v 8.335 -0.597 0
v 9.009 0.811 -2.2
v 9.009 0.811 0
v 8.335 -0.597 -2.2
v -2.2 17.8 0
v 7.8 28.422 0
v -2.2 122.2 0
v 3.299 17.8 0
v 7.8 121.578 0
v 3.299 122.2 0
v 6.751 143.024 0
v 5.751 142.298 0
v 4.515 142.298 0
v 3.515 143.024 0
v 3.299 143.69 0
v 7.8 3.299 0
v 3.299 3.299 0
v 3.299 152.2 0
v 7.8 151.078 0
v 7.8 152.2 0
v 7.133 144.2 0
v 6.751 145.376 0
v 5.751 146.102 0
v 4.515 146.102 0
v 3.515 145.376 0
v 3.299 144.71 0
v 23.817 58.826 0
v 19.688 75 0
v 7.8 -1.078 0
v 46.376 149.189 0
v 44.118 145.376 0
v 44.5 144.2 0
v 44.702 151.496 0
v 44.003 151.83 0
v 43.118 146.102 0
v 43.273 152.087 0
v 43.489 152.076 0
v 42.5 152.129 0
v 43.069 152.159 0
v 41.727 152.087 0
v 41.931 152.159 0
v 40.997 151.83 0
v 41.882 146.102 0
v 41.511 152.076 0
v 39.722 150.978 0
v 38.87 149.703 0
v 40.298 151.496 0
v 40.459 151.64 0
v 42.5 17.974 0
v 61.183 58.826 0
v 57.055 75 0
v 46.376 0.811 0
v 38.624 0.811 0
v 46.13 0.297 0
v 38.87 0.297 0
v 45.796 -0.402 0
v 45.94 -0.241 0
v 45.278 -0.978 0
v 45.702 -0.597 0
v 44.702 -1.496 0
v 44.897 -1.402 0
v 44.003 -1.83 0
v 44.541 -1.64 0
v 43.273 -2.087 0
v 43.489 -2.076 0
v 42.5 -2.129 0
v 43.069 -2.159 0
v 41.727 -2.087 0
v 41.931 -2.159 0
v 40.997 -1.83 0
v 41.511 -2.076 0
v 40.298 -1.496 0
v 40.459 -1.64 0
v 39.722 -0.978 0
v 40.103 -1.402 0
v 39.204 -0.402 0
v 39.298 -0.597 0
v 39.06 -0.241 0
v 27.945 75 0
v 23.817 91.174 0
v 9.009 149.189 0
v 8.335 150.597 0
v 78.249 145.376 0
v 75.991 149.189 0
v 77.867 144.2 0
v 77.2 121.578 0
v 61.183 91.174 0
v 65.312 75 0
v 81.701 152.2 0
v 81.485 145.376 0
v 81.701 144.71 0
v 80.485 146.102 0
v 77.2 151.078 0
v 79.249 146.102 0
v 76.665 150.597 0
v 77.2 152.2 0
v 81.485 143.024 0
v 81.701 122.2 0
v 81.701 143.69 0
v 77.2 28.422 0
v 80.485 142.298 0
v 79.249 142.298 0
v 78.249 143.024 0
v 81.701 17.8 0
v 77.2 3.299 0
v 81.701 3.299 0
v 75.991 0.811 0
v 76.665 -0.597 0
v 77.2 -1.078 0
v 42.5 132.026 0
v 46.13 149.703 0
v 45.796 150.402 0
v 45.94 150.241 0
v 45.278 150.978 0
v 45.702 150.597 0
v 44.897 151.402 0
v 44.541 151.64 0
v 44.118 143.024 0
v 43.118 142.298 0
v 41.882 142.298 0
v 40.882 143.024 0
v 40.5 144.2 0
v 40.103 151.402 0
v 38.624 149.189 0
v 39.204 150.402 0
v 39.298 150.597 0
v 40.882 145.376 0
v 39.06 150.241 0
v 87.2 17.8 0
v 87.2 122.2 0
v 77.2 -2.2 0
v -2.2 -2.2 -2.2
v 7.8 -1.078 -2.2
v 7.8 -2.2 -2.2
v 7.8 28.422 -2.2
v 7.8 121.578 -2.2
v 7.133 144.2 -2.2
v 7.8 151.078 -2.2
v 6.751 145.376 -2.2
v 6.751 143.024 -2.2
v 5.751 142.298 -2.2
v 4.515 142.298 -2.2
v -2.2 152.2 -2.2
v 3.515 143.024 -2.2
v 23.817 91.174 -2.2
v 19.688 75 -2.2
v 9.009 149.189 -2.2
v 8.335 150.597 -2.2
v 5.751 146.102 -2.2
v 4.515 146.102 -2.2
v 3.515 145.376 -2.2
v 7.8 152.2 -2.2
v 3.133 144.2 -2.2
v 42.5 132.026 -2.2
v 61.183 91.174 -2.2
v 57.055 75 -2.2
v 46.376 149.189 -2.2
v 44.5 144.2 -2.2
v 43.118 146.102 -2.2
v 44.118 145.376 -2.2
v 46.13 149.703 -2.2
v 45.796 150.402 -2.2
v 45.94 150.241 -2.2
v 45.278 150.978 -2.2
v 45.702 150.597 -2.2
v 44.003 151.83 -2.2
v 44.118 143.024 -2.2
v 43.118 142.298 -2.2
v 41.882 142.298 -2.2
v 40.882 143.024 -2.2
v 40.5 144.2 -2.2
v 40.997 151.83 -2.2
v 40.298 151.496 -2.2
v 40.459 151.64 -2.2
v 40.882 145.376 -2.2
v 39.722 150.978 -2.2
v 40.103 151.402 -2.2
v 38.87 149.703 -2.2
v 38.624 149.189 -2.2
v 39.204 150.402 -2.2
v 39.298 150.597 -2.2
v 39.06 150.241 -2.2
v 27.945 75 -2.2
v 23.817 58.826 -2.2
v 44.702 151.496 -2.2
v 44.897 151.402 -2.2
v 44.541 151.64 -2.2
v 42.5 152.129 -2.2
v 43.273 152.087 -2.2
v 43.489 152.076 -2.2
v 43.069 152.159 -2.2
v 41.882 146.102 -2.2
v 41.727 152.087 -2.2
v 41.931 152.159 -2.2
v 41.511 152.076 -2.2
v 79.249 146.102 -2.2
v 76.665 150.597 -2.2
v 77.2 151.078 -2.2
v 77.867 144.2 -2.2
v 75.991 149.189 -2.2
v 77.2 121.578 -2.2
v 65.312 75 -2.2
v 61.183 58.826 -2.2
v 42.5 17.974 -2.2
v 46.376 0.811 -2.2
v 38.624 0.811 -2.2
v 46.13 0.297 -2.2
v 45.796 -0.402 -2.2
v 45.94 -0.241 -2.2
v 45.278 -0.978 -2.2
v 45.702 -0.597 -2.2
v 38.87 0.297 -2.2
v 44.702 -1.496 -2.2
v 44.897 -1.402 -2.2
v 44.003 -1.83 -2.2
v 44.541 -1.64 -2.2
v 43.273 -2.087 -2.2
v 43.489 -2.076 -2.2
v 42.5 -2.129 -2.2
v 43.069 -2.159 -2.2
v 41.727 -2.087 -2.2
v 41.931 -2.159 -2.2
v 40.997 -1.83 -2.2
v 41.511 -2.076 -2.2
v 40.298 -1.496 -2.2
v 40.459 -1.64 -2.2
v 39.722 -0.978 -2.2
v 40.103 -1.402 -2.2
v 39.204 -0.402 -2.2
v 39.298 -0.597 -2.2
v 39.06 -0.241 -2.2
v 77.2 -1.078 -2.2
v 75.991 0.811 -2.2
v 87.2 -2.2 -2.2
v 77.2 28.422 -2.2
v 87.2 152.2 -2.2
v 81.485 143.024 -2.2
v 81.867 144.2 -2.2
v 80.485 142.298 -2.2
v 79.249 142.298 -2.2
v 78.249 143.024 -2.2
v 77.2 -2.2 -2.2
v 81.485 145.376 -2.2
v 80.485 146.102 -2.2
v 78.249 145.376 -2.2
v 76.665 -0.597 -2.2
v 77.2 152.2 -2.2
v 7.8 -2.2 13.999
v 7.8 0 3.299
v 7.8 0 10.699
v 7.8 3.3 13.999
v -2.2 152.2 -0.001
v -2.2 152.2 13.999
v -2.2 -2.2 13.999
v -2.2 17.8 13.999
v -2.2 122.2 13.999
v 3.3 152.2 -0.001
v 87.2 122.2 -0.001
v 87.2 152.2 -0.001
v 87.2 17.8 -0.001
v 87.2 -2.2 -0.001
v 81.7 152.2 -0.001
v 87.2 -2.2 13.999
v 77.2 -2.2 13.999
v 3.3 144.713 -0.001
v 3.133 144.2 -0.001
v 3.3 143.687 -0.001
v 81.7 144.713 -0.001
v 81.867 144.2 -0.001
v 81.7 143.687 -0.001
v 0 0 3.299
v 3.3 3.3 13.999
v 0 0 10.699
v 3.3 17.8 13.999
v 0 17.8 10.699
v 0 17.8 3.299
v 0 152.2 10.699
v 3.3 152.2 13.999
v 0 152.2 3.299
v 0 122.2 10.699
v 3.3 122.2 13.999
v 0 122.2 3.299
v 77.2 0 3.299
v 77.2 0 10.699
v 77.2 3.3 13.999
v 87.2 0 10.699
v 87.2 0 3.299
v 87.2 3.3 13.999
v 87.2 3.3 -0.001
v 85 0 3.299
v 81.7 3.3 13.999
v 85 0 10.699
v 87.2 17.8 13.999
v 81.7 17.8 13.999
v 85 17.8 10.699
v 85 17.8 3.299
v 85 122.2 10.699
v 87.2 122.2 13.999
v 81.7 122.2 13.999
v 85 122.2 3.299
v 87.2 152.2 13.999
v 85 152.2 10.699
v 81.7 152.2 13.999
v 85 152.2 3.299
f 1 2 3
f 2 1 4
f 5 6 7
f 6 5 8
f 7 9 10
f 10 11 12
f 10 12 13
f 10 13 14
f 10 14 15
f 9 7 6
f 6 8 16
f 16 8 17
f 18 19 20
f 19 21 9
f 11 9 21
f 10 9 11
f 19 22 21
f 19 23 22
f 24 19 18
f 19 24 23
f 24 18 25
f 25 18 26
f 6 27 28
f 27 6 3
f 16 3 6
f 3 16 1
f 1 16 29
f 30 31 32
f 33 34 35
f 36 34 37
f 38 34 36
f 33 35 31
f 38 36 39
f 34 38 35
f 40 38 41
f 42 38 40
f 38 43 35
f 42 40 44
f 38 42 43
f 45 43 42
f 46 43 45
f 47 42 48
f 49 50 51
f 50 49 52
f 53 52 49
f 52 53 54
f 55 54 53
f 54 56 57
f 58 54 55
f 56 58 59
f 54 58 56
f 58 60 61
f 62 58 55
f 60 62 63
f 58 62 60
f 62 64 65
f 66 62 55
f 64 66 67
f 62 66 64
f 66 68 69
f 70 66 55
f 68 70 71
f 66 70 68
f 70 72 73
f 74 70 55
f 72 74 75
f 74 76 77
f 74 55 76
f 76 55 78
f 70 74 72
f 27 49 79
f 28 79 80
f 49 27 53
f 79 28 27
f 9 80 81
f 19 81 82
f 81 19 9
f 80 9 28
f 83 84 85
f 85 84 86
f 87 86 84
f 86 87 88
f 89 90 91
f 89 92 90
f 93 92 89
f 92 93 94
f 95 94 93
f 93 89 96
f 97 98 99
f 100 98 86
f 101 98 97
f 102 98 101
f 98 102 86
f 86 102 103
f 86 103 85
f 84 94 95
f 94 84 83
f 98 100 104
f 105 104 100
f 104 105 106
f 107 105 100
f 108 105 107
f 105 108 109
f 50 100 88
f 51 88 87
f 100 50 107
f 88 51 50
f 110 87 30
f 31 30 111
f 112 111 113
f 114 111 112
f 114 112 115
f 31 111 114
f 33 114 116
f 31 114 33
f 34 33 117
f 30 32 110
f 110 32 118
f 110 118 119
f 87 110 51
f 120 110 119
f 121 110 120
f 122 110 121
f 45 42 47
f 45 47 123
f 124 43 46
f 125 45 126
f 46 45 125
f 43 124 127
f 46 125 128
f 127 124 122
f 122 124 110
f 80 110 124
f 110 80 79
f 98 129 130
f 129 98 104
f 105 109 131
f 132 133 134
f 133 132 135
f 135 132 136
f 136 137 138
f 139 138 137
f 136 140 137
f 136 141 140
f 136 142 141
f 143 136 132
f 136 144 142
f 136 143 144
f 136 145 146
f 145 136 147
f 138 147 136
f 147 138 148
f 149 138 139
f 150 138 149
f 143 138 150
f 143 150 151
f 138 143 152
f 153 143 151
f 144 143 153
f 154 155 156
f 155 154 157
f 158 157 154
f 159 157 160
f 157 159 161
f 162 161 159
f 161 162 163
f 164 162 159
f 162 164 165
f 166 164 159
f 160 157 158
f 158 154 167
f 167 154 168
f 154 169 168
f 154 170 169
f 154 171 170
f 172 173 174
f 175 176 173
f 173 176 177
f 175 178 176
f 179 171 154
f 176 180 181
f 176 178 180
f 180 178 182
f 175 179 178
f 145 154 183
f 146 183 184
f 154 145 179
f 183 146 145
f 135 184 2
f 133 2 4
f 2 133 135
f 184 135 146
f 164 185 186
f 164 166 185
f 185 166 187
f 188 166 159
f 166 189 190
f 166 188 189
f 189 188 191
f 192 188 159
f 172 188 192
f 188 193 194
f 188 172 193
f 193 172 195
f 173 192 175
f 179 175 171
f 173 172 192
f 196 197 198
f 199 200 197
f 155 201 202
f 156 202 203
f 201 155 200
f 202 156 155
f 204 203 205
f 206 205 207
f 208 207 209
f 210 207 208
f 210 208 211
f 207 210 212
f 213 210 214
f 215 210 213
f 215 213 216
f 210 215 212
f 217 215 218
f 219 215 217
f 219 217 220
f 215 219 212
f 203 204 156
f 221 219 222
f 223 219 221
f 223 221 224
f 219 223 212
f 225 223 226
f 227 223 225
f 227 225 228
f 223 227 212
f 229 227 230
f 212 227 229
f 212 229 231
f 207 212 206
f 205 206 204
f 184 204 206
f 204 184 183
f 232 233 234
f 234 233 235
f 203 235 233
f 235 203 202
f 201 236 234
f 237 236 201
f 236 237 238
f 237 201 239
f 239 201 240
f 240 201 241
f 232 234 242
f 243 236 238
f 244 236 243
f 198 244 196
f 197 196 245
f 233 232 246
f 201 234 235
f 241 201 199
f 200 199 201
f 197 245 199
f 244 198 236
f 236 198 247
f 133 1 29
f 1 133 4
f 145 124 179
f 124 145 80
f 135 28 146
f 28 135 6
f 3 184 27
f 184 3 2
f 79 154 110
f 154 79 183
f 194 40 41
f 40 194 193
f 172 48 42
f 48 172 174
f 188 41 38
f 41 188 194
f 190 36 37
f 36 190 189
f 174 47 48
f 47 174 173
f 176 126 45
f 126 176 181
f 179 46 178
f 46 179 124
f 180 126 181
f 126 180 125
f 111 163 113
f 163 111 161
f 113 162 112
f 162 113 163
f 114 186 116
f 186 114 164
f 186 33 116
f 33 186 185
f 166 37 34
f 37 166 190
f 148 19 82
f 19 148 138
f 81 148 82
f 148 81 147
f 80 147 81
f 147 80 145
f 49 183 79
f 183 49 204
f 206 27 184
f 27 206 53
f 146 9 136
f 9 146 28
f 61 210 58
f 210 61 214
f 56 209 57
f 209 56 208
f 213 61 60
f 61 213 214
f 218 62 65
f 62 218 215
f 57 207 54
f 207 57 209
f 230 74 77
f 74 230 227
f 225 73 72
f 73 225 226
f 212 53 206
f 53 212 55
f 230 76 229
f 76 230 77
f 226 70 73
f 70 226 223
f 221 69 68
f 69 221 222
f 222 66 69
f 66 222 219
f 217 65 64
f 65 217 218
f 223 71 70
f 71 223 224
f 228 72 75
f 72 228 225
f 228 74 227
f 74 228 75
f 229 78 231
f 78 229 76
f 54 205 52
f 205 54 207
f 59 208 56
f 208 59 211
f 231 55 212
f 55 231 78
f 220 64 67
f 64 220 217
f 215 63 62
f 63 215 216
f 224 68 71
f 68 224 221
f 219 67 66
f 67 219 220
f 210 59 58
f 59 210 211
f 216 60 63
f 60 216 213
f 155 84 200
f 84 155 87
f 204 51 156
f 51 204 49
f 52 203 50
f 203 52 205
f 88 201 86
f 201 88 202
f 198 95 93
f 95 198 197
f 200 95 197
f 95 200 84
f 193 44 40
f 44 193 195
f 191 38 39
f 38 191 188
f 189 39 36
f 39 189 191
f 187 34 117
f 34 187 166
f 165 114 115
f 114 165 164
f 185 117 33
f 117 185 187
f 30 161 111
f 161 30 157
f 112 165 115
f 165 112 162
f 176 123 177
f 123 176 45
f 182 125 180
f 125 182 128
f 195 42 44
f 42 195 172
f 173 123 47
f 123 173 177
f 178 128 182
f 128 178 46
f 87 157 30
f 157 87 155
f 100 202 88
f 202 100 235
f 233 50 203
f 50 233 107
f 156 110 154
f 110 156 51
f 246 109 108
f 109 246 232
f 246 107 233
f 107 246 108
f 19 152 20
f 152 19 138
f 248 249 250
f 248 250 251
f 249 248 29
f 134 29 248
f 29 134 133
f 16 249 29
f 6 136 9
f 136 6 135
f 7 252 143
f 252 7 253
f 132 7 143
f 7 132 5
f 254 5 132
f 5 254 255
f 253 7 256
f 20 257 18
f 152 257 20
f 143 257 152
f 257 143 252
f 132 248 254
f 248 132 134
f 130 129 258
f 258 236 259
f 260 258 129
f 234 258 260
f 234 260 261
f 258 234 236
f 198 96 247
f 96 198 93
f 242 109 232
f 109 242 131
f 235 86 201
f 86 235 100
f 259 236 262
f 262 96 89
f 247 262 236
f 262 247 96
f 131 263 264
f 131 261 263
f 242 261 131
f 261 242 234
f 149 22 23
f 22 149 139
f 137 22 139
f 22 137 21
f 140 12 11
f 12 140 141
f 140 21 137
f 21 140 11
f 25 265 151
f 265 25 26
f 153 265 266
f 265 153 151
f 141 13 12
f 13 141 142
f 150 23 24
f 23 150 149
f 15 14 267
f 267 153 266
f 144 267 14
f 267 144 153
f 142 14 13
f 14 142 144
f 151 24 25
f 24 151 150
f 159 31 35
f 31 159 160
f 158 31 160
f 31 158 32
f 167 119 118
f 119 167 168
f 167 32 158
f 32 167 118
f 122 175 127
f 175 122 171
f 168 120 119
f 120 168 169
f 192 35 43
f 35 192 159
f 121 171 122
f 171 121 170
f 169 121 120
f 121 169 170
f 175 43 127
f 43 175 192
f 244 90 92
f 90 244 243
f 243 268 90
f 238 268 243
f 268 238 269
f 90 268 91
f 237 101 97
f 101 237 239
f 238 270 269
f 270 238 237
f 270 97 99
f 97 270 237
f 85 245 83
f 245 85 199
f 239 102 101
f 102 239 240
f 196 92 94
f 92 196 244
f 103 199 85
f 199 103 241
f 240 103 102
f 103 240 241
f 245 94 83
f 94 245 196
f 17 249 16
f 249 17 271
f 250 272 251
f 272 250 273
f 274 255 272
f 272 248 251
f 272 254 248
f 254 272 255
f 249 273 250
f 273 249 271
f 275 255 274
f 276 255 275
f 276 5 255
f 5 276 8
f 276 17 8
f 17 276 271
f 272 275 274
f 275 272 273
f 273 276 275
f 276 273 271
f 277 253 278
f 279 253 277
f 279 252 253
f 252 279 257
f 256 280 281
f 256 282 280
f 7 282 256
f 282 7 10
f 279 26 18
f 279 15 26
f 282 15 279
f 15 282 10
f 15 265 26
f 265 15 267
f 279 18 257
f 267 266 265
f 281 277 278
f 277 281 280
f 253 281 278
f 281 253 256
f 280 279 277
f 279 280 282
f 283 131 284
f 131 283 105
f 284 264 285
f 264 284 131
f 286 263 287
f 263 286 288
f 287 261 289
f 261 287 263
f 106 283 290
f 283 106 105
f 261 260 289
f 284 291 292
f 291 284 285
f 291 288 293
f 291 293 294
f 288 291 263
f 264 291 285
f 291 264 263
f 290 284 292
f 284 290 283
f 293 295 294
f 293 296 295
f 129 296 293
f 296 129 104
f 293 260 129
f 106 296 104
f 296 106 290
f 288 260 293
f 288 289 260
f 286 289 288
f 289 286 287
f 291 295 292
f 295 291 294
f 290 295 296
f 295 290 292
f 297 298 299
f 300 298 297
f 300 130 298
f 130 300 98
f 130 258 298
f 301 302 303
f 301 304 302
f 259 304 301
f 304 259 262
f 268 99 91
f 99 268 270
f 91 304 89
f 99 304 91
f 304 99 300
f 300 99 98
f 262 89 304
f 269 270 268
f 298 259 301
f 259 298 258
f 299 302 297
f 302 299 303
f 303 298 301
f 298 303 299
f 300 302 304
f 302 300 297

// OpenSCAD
// Boat phone holder

delta = 0.001;    // Extra distance to avoid coincident surfaces 
sqrt2 = sqrt(2);

hp    = 150;      // Height of phone
wp    = 85;       // Width of phone
dp    = 14;       // Depth of phone
dpe   = 12;       // Depth of phone at edge

module Bevel(l,t,orientation)
{
  // Bevel with corner along +X axis from origin, with orientation:
  //  0 -> facing +Y, +Z
  //  1 -> facing -Y, +Z
  //  2 -> facing -Y, -Z
  //  3 -> facing +Y, -Z
  rotate([orientation*90,0,0])
  {
    intersection()
    {
      translate([0,0,-t])
        rotate([45,0,0])
          cube([l,t*sqrt2,t*sqrt2]);
      cube([l,t*2,t*2]);
    }
  }
}

module EdgeClasp(l,h,t,orientation)
{
  // Edge clip on X-Z plane, with orientation:
  //  0 -> facing +Y
  //  1 -> facing +X
  //  2 -> facing -Y
  //  3 -> facing -X
  //
  // l = extent along aligneed axis (from origin, + or -)
  // t = thickness of edge
  //
  la = abs(l);
  ls = orientation==0 || orientation == 3 ? l : -l ;
  rotate([0,0,-orientation*90])
    translate([0.5*(ls-la),-t,-delta])
    {
      cube([la,t,h]);
      Bevel(la,t*2.5,0);
      translate([0,0,h])
        Bevel(la,t*2.5,3);
    }
}

module AngledStrip(x1,y1,x2,y2,w,t)
{
  xd = x2-x1;
  yd = y2-y1;
  l = sqrt(xd*xd+yd*yd);
  translate([x1,y1,0])
  {
    rotate([0,0,atan2(yd,xd)])
    {
      translate([0,0,0])    cylinder(r=w/2, h=t, $fn=16);
      translate([0,-w/2,0]) cube([l,w,t]);
      translate([l,0,0])    cylinder(r=w/2, h=t, $fn=16);
    }
  }
}

module BasePlate(w,h,t,ws,wc)
{
  x1 = ws - wc/3;
  x2 = w/2;
  x3 = w - x1;
  y1 = wc/2;
  y2 = h - y1;
  hr = 2;
  yh = y2 - (2*hr);
  difference()
  {
    union()
    {
      translate([0,0,0]) cube([ws,h,t]);
      AngledStrip(x1,y1,x2,y2,wc,t);
      AngledStrip(x1,y2,x2,y1,wc,t);
      AngledStrip(x2,y1,x3,y2,wc,t);
      AngledStrip(x2,y2,x3,y1,wc,t);
      translate([w-ws,0,0]) cube([ws,h,t]);
    }
    translate([x1,yh,-delta]) cylinder(r=hr,h=t*2,$fn=10);
    translate([x2,yh,-delta]) cylinder(r=hr,h=t*2,$fn=10);
    translate([x3,yh,-delta]) cylinder(r=hr,h=t*2,$fn=10);
  }
}

module PhoneHolder(wp,hp,dp,t,ws,wc)
{
  // ws = width of side
  // wc = width of ...
  translate([-t,-t,-t])  BasePlate(wp+t*2,hp+t*2,t,ws,wc);

  translate([-t,0,0])    EdgeClasp(ws,  dp, t, 0);
  translate([0,-t,0])    EdgeClasp(20,  dp, t, 1);
  translate([0,hp+t,0])  EdgeClasp(-30, dp, t, 1);

  translate([wp+t,0,0])  EdgeClasp(-ws, dp, t,0);
  translate([wp,-t,0])   EdgeClasp(20,  dp, t,3);
  translate([wp,hp+t,0]) EdgeClasp(-30, dp, t,3);
}

//Bevel(20,5,3);

//EdgeClasp(20,12,2,0);

//AngledStrip(10,10,20,-40,6,2);

t=2.2;

//BasePlate(wp+2*t, hp+2*t, t, 10, 6);

PhoneHolder(wp, hp, dp, t, 10, 8);
